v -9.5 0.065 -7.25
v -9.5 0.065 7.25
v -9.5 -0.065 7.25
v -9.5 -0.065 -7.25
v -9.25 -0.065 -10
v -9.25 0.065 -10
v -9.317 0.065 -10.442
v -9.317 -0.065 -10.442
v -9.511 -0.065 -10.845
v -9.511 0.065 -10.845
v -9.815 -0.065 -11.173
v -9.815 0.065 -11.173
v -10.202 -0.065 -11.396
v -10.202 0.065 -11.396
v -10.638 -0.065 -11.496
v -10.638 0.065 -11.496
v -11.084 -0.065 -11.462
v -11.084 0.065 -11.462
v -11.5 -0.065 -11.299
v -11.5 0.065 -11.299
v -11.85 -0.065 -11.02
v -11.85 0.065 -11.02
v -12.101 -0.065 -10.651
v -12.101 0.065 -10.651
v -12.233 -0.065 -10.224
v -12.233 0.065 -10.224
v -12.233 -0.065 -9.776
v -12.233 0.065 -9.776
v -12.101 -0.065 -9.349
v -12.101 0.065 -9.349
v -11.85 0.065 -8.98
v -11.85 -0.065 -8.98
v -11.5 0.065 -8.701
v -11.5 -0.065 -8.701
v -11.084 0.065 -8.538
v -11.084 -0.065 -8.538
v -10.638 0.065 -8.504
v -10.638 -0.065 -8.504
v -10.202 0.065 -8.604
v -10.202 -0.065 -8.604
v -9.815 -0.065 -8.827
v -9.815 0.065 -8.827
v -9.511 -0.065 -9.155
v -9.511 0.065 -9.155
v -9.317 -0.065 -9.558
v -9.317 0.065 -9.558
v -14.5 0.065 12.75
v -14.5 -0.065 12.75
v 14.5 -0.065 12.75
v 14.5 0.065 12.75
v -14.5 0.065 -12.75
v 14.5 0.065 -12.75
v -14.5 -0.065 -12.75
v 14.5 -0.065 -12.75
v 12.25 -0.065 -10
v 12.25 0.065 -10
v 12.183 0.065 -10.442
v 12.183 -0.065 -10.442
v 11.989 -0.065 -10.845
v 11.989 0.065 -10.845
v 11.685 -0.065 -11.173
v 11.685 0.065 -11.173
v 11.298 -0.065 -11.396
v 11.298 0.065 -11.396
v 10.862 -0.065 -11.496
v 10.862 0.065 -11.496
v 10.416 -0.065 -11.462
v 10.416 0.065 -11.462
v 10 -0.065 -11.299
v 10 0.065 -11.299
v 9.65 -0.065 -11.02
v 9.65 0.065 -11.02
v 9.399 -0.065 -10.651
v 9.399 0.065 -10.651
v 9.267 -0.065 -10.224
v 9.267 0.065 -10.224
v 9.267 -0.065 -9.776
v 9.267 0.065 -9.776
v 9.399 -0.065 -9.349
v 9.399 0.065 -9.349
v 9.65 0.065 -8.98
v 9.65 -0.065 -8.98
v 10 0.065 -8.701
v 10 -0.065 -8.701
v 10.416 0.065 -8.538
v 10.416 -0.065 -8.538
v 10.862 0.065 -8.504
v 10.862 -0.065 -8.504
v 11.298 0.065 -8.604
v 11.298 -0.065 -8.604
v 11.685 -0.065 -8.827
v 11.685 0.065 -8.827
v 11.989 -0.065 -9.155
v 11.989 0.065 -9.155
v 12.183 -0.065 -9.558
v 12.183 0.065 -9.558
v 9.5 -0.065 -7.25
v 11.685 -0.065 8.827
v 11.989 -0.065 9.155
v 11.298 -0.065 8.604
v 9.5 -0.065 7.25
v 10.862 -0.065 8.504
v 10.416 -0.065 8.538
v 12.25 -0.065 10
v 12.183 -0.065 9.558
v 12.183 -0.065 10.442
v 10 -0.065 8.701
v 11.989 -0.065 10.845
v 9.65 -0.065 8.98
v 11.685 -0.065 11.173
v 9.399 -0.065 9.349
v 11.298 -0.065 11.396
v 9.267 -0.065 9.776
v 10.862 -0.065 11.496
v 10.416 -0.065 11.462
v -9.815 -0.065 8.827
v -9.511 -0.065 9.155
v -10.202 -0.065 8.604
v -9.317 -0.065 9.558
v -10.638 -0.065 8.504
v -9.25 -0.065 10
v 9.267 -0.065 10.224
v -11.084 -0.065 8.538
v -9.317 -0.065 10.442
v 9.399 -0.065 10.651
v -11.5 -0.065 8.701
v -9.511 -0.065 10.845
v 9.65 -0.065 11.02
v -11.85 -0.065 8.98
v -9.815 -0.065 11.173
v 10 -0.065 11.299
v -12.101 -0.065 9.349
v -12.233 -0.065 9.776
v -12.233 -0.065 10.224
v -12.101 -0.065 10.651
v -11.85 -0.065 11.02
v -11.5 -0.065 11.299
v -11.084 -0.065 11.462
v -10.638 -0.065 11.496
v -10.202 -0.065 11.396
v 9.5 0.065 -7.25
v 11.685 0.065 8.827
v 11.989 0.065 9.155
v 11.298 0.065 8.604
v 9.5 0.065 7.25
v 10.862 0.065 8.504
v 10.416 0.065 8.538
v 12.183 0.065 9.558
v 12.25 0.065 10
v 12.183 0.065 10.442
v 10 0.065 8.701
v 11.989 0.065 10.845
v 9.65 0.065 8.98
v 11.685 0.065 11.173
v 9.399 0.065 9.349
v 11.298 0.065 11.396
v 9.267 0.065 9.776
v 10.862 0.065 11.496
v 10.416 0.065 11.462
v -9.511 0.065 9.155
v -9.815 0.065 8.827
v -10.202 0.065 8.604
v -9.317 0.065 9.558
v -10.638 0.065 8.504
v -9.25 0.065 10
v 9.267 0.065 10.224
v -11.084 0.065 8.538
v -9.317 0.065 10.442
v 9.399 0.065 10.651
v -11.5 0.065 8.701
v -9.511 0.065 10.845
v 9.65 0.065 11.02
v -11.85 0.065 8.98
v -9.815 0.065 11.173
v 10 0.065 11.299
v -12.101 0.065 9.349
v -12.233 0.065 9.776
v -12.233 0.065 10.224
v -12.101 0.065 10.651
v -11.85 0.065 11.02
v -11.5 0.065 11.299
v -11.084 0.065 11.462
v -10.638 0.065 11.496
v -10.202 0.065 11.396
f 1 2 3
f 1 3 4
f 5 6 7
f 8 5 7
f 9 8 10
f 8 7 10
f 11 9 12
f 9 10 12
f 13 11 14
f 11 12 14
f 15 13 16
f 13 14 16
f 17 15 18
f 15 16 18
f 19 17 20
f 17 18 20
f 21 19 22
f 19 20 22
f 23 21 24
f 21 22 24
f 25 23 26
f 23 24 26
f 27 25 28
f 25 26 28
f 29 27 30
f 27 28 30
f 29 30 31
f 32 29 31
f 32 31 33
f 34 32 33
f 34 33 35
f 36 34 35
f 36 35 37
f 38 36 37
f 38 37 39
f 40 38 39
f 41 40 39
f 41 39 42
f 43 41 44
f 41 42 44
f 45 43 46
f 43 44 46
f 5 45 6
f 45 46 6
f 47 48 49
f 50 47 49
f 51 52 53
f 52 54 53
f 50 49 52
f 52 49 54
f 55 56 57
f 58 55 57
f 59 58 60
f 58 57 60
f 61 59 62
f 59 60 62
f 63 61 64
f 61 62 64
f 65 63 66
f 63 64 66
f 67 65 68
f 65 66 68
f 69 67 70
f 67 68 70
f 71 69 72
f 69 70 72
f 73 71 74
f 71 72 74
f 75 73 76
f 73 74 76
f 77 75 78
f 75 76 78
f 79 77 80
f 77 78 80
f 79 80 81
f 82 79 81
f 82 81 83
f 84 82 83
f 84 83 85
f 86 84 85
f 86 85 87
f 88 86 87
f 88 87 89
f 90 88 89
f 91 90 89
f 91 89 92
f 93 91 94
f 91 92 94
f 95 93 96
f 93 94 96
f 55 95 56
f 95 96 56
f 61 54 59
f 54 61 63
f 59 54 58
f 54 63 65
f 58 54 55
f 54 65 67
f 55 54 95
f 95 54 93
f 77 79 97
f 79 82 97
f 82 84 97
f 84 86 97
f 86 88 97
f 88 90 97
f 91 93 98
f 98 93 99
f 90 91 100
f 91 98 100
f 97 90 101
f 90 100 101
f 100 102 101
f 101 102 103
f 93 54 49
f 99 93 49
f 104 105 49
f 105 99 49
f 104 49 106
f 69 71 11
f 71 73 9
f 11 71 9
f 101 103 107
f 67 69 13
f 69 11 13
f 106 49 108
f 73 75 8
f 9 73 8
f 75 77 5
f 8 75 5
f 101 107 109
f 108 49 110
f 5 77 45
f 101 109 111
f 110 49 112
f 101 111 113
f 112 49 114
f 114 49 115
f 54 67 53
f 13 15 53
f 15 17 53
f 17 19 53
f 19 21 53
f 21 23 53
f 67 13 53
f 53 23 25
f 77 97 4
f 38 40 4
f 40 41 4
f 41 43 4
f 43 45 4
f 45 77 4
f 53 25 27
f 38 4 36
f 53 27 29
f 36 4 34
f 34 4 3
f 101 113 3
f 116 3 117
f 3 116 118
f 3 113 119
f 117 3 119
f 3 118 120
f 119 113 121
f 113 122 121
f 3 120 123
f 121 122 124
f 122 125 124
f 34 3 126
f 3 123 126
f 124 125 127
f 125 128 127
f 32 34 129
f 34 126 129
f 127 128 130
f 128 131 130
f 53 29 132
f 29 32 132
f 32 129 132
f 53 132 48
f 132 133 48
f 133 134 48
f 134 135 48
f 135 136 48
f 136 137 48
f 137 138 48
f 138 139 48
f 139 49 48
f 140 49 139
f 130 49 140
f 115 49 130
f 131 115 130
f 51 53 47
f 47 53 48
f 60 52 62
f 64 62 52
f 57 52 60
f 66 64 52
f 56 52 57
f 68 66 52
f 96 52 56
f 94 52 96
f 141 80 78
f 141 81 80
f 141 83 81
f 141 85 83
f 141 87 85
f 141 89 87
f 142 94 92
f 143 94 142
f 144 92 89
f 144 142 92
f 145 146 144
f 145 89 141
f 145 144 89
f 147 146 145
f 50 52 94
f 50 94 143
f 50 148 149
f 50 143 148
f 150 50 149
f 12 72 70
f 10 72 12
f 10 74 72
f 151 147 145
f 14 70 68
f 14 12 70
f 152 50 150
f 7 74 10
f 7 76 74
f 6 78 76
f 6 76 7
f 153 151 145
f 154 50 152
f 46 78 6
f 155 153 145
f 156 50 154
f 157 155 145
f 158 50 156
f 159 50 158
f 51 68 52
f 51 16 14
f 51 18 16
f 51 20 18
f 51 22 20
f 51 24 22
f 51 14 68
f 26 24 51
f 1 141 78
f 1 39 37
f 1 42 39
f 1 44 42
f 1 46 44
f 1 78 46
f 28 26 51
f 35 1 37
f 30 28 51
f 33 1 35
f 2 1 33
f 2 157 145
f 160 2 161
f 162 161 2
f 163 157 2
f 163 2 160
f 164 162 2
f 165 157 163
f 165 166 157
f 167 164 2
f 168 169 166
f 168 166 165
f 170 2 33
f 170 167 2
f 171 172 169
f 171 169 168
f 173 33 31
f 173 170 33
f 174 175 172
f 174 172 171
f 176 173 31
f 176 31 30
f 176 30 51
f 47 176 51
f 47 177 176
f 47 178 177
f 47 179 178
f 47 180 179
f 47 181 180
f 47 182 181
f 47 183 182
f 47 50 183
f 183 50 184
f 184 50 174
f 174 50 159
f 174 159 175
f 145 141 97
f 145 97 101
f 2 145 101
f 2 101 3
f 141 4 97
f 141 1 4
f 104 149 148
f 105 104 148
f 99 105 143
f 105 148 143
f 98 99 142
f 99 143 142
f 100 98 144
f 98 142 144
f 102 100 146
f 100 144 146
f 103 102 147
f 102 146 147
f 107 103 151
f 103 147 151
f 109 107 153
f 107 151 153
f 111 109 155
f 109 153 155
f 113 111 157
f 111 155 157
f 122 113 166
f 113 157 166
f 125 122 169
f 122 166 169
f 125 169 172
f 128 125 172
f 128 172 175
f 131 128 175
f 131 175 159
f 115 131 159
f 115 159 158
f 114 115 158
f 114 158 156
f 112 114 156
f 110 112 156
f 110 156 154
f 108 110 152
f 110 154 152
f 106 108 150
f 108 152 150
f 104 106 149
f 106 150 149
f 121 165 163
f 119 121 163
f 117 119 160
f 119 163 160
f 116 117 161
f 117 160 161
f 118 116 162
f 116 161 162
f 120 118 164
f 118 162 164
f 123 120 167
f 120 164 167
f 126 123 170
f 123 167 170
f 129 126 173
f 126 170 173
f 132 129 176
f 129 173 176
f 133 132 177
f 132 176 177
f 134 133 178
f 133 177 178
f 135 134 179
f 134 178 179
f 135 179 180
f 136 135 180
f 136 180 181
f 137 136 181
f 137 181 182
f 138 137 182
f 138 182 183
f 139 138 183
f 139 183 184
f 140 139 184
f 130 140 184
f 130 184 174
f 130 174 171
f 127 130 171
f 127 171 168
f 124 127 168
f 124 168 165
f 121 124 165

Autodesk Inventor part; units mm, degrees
ref_plane "YZ Plane" through (0, 0, 0) normal (1, 0, 0) x (0, 1, 0)
ref_plane "XZ Plane" through (0, 0, 0) normal (0, 1, 0) x (-1, 0, 0)
ref_plane "XY Plane" through (0, 0, 0) normal (0, 0, 1) x (1, 0, 0)
sketch "Sketch1" plane through (0, 0, 0) normal (0, 1, 0) x (-1, 0, 0)
  line L0 (14.5, 12.75) -> (-14.5, 12.75)
  line L1 (-14.5, 12.75) -> (-14.5, -12.75)
  line L2 (-14.5, -12.75) -> (14.5, -12.75)
  line L3 (14.5, -12.75) -> (14.5, 12.75)
  line L4 (14.5, 12.75) -> (-14.5, -12.75) construction
  line L5 (-14.5, 12.75) -> (14.5, -12.75) construction
  point P0 (0, 0)
  dimension "d0" = 29
  dimension "d1" = 25.5
extrude "Extrusion1" add sketch "Sketch1" along normal mid plane 0.13
sketch "Sketch2" plane through (0, 0.065, 0) normal (0, 1, 0) x (1, 0, 0)
  circle A0 centre (-10.75, 10) radius 1.5
  line L0 (14.5, 12.75) -> (-14.5, 12.75) projected
  line L1 (-14.5, 12.75) -> (-14.5, -12.75) projected
  circle A1 centre (10.75, 10) radius 1.5
  circle A2 centre (-10.75, -10) radius 1.5
  circle A3 centre (10.75, -10) radius 1.5
  point P0 (0, 0)
  dimension "d4" = 3
  dimension "d5" = 2.75
  dimension "d6" = 3.75
  dimension "d9" = 21.5
  dimension "d12" = 20
extrude "Extrusion2" cut sketch "Sketch2" against normal through all
sketch "Sketch3" plane through (0, 0.065, 0) normal (0, 1, 0) x (1, 0, 0)
  line L0 (-9.5, 7.25) -> (9.5, 7.25)
  line L1 (9.5, 7.25) -> (9.5, -7.25)
  line L2 (9.5, -7.25) -> (-9.5, -7.25)
  line L3 (-9.5, -7.25) -> (-9.5, 7.25)
  line L4 (-9.5, 7.25) -> (9.5, -7.25) construction
  line L5 (9.5, 7.25) -> (-9.5, -7.25) construction
  point P0 (0, 0)
  dimension "d17" = 19
  dimension "d18" = 14.5
extrude "Extrusion3" cut sketch "Sketch3" against normal through all
properties material "Nylon 6/6"
